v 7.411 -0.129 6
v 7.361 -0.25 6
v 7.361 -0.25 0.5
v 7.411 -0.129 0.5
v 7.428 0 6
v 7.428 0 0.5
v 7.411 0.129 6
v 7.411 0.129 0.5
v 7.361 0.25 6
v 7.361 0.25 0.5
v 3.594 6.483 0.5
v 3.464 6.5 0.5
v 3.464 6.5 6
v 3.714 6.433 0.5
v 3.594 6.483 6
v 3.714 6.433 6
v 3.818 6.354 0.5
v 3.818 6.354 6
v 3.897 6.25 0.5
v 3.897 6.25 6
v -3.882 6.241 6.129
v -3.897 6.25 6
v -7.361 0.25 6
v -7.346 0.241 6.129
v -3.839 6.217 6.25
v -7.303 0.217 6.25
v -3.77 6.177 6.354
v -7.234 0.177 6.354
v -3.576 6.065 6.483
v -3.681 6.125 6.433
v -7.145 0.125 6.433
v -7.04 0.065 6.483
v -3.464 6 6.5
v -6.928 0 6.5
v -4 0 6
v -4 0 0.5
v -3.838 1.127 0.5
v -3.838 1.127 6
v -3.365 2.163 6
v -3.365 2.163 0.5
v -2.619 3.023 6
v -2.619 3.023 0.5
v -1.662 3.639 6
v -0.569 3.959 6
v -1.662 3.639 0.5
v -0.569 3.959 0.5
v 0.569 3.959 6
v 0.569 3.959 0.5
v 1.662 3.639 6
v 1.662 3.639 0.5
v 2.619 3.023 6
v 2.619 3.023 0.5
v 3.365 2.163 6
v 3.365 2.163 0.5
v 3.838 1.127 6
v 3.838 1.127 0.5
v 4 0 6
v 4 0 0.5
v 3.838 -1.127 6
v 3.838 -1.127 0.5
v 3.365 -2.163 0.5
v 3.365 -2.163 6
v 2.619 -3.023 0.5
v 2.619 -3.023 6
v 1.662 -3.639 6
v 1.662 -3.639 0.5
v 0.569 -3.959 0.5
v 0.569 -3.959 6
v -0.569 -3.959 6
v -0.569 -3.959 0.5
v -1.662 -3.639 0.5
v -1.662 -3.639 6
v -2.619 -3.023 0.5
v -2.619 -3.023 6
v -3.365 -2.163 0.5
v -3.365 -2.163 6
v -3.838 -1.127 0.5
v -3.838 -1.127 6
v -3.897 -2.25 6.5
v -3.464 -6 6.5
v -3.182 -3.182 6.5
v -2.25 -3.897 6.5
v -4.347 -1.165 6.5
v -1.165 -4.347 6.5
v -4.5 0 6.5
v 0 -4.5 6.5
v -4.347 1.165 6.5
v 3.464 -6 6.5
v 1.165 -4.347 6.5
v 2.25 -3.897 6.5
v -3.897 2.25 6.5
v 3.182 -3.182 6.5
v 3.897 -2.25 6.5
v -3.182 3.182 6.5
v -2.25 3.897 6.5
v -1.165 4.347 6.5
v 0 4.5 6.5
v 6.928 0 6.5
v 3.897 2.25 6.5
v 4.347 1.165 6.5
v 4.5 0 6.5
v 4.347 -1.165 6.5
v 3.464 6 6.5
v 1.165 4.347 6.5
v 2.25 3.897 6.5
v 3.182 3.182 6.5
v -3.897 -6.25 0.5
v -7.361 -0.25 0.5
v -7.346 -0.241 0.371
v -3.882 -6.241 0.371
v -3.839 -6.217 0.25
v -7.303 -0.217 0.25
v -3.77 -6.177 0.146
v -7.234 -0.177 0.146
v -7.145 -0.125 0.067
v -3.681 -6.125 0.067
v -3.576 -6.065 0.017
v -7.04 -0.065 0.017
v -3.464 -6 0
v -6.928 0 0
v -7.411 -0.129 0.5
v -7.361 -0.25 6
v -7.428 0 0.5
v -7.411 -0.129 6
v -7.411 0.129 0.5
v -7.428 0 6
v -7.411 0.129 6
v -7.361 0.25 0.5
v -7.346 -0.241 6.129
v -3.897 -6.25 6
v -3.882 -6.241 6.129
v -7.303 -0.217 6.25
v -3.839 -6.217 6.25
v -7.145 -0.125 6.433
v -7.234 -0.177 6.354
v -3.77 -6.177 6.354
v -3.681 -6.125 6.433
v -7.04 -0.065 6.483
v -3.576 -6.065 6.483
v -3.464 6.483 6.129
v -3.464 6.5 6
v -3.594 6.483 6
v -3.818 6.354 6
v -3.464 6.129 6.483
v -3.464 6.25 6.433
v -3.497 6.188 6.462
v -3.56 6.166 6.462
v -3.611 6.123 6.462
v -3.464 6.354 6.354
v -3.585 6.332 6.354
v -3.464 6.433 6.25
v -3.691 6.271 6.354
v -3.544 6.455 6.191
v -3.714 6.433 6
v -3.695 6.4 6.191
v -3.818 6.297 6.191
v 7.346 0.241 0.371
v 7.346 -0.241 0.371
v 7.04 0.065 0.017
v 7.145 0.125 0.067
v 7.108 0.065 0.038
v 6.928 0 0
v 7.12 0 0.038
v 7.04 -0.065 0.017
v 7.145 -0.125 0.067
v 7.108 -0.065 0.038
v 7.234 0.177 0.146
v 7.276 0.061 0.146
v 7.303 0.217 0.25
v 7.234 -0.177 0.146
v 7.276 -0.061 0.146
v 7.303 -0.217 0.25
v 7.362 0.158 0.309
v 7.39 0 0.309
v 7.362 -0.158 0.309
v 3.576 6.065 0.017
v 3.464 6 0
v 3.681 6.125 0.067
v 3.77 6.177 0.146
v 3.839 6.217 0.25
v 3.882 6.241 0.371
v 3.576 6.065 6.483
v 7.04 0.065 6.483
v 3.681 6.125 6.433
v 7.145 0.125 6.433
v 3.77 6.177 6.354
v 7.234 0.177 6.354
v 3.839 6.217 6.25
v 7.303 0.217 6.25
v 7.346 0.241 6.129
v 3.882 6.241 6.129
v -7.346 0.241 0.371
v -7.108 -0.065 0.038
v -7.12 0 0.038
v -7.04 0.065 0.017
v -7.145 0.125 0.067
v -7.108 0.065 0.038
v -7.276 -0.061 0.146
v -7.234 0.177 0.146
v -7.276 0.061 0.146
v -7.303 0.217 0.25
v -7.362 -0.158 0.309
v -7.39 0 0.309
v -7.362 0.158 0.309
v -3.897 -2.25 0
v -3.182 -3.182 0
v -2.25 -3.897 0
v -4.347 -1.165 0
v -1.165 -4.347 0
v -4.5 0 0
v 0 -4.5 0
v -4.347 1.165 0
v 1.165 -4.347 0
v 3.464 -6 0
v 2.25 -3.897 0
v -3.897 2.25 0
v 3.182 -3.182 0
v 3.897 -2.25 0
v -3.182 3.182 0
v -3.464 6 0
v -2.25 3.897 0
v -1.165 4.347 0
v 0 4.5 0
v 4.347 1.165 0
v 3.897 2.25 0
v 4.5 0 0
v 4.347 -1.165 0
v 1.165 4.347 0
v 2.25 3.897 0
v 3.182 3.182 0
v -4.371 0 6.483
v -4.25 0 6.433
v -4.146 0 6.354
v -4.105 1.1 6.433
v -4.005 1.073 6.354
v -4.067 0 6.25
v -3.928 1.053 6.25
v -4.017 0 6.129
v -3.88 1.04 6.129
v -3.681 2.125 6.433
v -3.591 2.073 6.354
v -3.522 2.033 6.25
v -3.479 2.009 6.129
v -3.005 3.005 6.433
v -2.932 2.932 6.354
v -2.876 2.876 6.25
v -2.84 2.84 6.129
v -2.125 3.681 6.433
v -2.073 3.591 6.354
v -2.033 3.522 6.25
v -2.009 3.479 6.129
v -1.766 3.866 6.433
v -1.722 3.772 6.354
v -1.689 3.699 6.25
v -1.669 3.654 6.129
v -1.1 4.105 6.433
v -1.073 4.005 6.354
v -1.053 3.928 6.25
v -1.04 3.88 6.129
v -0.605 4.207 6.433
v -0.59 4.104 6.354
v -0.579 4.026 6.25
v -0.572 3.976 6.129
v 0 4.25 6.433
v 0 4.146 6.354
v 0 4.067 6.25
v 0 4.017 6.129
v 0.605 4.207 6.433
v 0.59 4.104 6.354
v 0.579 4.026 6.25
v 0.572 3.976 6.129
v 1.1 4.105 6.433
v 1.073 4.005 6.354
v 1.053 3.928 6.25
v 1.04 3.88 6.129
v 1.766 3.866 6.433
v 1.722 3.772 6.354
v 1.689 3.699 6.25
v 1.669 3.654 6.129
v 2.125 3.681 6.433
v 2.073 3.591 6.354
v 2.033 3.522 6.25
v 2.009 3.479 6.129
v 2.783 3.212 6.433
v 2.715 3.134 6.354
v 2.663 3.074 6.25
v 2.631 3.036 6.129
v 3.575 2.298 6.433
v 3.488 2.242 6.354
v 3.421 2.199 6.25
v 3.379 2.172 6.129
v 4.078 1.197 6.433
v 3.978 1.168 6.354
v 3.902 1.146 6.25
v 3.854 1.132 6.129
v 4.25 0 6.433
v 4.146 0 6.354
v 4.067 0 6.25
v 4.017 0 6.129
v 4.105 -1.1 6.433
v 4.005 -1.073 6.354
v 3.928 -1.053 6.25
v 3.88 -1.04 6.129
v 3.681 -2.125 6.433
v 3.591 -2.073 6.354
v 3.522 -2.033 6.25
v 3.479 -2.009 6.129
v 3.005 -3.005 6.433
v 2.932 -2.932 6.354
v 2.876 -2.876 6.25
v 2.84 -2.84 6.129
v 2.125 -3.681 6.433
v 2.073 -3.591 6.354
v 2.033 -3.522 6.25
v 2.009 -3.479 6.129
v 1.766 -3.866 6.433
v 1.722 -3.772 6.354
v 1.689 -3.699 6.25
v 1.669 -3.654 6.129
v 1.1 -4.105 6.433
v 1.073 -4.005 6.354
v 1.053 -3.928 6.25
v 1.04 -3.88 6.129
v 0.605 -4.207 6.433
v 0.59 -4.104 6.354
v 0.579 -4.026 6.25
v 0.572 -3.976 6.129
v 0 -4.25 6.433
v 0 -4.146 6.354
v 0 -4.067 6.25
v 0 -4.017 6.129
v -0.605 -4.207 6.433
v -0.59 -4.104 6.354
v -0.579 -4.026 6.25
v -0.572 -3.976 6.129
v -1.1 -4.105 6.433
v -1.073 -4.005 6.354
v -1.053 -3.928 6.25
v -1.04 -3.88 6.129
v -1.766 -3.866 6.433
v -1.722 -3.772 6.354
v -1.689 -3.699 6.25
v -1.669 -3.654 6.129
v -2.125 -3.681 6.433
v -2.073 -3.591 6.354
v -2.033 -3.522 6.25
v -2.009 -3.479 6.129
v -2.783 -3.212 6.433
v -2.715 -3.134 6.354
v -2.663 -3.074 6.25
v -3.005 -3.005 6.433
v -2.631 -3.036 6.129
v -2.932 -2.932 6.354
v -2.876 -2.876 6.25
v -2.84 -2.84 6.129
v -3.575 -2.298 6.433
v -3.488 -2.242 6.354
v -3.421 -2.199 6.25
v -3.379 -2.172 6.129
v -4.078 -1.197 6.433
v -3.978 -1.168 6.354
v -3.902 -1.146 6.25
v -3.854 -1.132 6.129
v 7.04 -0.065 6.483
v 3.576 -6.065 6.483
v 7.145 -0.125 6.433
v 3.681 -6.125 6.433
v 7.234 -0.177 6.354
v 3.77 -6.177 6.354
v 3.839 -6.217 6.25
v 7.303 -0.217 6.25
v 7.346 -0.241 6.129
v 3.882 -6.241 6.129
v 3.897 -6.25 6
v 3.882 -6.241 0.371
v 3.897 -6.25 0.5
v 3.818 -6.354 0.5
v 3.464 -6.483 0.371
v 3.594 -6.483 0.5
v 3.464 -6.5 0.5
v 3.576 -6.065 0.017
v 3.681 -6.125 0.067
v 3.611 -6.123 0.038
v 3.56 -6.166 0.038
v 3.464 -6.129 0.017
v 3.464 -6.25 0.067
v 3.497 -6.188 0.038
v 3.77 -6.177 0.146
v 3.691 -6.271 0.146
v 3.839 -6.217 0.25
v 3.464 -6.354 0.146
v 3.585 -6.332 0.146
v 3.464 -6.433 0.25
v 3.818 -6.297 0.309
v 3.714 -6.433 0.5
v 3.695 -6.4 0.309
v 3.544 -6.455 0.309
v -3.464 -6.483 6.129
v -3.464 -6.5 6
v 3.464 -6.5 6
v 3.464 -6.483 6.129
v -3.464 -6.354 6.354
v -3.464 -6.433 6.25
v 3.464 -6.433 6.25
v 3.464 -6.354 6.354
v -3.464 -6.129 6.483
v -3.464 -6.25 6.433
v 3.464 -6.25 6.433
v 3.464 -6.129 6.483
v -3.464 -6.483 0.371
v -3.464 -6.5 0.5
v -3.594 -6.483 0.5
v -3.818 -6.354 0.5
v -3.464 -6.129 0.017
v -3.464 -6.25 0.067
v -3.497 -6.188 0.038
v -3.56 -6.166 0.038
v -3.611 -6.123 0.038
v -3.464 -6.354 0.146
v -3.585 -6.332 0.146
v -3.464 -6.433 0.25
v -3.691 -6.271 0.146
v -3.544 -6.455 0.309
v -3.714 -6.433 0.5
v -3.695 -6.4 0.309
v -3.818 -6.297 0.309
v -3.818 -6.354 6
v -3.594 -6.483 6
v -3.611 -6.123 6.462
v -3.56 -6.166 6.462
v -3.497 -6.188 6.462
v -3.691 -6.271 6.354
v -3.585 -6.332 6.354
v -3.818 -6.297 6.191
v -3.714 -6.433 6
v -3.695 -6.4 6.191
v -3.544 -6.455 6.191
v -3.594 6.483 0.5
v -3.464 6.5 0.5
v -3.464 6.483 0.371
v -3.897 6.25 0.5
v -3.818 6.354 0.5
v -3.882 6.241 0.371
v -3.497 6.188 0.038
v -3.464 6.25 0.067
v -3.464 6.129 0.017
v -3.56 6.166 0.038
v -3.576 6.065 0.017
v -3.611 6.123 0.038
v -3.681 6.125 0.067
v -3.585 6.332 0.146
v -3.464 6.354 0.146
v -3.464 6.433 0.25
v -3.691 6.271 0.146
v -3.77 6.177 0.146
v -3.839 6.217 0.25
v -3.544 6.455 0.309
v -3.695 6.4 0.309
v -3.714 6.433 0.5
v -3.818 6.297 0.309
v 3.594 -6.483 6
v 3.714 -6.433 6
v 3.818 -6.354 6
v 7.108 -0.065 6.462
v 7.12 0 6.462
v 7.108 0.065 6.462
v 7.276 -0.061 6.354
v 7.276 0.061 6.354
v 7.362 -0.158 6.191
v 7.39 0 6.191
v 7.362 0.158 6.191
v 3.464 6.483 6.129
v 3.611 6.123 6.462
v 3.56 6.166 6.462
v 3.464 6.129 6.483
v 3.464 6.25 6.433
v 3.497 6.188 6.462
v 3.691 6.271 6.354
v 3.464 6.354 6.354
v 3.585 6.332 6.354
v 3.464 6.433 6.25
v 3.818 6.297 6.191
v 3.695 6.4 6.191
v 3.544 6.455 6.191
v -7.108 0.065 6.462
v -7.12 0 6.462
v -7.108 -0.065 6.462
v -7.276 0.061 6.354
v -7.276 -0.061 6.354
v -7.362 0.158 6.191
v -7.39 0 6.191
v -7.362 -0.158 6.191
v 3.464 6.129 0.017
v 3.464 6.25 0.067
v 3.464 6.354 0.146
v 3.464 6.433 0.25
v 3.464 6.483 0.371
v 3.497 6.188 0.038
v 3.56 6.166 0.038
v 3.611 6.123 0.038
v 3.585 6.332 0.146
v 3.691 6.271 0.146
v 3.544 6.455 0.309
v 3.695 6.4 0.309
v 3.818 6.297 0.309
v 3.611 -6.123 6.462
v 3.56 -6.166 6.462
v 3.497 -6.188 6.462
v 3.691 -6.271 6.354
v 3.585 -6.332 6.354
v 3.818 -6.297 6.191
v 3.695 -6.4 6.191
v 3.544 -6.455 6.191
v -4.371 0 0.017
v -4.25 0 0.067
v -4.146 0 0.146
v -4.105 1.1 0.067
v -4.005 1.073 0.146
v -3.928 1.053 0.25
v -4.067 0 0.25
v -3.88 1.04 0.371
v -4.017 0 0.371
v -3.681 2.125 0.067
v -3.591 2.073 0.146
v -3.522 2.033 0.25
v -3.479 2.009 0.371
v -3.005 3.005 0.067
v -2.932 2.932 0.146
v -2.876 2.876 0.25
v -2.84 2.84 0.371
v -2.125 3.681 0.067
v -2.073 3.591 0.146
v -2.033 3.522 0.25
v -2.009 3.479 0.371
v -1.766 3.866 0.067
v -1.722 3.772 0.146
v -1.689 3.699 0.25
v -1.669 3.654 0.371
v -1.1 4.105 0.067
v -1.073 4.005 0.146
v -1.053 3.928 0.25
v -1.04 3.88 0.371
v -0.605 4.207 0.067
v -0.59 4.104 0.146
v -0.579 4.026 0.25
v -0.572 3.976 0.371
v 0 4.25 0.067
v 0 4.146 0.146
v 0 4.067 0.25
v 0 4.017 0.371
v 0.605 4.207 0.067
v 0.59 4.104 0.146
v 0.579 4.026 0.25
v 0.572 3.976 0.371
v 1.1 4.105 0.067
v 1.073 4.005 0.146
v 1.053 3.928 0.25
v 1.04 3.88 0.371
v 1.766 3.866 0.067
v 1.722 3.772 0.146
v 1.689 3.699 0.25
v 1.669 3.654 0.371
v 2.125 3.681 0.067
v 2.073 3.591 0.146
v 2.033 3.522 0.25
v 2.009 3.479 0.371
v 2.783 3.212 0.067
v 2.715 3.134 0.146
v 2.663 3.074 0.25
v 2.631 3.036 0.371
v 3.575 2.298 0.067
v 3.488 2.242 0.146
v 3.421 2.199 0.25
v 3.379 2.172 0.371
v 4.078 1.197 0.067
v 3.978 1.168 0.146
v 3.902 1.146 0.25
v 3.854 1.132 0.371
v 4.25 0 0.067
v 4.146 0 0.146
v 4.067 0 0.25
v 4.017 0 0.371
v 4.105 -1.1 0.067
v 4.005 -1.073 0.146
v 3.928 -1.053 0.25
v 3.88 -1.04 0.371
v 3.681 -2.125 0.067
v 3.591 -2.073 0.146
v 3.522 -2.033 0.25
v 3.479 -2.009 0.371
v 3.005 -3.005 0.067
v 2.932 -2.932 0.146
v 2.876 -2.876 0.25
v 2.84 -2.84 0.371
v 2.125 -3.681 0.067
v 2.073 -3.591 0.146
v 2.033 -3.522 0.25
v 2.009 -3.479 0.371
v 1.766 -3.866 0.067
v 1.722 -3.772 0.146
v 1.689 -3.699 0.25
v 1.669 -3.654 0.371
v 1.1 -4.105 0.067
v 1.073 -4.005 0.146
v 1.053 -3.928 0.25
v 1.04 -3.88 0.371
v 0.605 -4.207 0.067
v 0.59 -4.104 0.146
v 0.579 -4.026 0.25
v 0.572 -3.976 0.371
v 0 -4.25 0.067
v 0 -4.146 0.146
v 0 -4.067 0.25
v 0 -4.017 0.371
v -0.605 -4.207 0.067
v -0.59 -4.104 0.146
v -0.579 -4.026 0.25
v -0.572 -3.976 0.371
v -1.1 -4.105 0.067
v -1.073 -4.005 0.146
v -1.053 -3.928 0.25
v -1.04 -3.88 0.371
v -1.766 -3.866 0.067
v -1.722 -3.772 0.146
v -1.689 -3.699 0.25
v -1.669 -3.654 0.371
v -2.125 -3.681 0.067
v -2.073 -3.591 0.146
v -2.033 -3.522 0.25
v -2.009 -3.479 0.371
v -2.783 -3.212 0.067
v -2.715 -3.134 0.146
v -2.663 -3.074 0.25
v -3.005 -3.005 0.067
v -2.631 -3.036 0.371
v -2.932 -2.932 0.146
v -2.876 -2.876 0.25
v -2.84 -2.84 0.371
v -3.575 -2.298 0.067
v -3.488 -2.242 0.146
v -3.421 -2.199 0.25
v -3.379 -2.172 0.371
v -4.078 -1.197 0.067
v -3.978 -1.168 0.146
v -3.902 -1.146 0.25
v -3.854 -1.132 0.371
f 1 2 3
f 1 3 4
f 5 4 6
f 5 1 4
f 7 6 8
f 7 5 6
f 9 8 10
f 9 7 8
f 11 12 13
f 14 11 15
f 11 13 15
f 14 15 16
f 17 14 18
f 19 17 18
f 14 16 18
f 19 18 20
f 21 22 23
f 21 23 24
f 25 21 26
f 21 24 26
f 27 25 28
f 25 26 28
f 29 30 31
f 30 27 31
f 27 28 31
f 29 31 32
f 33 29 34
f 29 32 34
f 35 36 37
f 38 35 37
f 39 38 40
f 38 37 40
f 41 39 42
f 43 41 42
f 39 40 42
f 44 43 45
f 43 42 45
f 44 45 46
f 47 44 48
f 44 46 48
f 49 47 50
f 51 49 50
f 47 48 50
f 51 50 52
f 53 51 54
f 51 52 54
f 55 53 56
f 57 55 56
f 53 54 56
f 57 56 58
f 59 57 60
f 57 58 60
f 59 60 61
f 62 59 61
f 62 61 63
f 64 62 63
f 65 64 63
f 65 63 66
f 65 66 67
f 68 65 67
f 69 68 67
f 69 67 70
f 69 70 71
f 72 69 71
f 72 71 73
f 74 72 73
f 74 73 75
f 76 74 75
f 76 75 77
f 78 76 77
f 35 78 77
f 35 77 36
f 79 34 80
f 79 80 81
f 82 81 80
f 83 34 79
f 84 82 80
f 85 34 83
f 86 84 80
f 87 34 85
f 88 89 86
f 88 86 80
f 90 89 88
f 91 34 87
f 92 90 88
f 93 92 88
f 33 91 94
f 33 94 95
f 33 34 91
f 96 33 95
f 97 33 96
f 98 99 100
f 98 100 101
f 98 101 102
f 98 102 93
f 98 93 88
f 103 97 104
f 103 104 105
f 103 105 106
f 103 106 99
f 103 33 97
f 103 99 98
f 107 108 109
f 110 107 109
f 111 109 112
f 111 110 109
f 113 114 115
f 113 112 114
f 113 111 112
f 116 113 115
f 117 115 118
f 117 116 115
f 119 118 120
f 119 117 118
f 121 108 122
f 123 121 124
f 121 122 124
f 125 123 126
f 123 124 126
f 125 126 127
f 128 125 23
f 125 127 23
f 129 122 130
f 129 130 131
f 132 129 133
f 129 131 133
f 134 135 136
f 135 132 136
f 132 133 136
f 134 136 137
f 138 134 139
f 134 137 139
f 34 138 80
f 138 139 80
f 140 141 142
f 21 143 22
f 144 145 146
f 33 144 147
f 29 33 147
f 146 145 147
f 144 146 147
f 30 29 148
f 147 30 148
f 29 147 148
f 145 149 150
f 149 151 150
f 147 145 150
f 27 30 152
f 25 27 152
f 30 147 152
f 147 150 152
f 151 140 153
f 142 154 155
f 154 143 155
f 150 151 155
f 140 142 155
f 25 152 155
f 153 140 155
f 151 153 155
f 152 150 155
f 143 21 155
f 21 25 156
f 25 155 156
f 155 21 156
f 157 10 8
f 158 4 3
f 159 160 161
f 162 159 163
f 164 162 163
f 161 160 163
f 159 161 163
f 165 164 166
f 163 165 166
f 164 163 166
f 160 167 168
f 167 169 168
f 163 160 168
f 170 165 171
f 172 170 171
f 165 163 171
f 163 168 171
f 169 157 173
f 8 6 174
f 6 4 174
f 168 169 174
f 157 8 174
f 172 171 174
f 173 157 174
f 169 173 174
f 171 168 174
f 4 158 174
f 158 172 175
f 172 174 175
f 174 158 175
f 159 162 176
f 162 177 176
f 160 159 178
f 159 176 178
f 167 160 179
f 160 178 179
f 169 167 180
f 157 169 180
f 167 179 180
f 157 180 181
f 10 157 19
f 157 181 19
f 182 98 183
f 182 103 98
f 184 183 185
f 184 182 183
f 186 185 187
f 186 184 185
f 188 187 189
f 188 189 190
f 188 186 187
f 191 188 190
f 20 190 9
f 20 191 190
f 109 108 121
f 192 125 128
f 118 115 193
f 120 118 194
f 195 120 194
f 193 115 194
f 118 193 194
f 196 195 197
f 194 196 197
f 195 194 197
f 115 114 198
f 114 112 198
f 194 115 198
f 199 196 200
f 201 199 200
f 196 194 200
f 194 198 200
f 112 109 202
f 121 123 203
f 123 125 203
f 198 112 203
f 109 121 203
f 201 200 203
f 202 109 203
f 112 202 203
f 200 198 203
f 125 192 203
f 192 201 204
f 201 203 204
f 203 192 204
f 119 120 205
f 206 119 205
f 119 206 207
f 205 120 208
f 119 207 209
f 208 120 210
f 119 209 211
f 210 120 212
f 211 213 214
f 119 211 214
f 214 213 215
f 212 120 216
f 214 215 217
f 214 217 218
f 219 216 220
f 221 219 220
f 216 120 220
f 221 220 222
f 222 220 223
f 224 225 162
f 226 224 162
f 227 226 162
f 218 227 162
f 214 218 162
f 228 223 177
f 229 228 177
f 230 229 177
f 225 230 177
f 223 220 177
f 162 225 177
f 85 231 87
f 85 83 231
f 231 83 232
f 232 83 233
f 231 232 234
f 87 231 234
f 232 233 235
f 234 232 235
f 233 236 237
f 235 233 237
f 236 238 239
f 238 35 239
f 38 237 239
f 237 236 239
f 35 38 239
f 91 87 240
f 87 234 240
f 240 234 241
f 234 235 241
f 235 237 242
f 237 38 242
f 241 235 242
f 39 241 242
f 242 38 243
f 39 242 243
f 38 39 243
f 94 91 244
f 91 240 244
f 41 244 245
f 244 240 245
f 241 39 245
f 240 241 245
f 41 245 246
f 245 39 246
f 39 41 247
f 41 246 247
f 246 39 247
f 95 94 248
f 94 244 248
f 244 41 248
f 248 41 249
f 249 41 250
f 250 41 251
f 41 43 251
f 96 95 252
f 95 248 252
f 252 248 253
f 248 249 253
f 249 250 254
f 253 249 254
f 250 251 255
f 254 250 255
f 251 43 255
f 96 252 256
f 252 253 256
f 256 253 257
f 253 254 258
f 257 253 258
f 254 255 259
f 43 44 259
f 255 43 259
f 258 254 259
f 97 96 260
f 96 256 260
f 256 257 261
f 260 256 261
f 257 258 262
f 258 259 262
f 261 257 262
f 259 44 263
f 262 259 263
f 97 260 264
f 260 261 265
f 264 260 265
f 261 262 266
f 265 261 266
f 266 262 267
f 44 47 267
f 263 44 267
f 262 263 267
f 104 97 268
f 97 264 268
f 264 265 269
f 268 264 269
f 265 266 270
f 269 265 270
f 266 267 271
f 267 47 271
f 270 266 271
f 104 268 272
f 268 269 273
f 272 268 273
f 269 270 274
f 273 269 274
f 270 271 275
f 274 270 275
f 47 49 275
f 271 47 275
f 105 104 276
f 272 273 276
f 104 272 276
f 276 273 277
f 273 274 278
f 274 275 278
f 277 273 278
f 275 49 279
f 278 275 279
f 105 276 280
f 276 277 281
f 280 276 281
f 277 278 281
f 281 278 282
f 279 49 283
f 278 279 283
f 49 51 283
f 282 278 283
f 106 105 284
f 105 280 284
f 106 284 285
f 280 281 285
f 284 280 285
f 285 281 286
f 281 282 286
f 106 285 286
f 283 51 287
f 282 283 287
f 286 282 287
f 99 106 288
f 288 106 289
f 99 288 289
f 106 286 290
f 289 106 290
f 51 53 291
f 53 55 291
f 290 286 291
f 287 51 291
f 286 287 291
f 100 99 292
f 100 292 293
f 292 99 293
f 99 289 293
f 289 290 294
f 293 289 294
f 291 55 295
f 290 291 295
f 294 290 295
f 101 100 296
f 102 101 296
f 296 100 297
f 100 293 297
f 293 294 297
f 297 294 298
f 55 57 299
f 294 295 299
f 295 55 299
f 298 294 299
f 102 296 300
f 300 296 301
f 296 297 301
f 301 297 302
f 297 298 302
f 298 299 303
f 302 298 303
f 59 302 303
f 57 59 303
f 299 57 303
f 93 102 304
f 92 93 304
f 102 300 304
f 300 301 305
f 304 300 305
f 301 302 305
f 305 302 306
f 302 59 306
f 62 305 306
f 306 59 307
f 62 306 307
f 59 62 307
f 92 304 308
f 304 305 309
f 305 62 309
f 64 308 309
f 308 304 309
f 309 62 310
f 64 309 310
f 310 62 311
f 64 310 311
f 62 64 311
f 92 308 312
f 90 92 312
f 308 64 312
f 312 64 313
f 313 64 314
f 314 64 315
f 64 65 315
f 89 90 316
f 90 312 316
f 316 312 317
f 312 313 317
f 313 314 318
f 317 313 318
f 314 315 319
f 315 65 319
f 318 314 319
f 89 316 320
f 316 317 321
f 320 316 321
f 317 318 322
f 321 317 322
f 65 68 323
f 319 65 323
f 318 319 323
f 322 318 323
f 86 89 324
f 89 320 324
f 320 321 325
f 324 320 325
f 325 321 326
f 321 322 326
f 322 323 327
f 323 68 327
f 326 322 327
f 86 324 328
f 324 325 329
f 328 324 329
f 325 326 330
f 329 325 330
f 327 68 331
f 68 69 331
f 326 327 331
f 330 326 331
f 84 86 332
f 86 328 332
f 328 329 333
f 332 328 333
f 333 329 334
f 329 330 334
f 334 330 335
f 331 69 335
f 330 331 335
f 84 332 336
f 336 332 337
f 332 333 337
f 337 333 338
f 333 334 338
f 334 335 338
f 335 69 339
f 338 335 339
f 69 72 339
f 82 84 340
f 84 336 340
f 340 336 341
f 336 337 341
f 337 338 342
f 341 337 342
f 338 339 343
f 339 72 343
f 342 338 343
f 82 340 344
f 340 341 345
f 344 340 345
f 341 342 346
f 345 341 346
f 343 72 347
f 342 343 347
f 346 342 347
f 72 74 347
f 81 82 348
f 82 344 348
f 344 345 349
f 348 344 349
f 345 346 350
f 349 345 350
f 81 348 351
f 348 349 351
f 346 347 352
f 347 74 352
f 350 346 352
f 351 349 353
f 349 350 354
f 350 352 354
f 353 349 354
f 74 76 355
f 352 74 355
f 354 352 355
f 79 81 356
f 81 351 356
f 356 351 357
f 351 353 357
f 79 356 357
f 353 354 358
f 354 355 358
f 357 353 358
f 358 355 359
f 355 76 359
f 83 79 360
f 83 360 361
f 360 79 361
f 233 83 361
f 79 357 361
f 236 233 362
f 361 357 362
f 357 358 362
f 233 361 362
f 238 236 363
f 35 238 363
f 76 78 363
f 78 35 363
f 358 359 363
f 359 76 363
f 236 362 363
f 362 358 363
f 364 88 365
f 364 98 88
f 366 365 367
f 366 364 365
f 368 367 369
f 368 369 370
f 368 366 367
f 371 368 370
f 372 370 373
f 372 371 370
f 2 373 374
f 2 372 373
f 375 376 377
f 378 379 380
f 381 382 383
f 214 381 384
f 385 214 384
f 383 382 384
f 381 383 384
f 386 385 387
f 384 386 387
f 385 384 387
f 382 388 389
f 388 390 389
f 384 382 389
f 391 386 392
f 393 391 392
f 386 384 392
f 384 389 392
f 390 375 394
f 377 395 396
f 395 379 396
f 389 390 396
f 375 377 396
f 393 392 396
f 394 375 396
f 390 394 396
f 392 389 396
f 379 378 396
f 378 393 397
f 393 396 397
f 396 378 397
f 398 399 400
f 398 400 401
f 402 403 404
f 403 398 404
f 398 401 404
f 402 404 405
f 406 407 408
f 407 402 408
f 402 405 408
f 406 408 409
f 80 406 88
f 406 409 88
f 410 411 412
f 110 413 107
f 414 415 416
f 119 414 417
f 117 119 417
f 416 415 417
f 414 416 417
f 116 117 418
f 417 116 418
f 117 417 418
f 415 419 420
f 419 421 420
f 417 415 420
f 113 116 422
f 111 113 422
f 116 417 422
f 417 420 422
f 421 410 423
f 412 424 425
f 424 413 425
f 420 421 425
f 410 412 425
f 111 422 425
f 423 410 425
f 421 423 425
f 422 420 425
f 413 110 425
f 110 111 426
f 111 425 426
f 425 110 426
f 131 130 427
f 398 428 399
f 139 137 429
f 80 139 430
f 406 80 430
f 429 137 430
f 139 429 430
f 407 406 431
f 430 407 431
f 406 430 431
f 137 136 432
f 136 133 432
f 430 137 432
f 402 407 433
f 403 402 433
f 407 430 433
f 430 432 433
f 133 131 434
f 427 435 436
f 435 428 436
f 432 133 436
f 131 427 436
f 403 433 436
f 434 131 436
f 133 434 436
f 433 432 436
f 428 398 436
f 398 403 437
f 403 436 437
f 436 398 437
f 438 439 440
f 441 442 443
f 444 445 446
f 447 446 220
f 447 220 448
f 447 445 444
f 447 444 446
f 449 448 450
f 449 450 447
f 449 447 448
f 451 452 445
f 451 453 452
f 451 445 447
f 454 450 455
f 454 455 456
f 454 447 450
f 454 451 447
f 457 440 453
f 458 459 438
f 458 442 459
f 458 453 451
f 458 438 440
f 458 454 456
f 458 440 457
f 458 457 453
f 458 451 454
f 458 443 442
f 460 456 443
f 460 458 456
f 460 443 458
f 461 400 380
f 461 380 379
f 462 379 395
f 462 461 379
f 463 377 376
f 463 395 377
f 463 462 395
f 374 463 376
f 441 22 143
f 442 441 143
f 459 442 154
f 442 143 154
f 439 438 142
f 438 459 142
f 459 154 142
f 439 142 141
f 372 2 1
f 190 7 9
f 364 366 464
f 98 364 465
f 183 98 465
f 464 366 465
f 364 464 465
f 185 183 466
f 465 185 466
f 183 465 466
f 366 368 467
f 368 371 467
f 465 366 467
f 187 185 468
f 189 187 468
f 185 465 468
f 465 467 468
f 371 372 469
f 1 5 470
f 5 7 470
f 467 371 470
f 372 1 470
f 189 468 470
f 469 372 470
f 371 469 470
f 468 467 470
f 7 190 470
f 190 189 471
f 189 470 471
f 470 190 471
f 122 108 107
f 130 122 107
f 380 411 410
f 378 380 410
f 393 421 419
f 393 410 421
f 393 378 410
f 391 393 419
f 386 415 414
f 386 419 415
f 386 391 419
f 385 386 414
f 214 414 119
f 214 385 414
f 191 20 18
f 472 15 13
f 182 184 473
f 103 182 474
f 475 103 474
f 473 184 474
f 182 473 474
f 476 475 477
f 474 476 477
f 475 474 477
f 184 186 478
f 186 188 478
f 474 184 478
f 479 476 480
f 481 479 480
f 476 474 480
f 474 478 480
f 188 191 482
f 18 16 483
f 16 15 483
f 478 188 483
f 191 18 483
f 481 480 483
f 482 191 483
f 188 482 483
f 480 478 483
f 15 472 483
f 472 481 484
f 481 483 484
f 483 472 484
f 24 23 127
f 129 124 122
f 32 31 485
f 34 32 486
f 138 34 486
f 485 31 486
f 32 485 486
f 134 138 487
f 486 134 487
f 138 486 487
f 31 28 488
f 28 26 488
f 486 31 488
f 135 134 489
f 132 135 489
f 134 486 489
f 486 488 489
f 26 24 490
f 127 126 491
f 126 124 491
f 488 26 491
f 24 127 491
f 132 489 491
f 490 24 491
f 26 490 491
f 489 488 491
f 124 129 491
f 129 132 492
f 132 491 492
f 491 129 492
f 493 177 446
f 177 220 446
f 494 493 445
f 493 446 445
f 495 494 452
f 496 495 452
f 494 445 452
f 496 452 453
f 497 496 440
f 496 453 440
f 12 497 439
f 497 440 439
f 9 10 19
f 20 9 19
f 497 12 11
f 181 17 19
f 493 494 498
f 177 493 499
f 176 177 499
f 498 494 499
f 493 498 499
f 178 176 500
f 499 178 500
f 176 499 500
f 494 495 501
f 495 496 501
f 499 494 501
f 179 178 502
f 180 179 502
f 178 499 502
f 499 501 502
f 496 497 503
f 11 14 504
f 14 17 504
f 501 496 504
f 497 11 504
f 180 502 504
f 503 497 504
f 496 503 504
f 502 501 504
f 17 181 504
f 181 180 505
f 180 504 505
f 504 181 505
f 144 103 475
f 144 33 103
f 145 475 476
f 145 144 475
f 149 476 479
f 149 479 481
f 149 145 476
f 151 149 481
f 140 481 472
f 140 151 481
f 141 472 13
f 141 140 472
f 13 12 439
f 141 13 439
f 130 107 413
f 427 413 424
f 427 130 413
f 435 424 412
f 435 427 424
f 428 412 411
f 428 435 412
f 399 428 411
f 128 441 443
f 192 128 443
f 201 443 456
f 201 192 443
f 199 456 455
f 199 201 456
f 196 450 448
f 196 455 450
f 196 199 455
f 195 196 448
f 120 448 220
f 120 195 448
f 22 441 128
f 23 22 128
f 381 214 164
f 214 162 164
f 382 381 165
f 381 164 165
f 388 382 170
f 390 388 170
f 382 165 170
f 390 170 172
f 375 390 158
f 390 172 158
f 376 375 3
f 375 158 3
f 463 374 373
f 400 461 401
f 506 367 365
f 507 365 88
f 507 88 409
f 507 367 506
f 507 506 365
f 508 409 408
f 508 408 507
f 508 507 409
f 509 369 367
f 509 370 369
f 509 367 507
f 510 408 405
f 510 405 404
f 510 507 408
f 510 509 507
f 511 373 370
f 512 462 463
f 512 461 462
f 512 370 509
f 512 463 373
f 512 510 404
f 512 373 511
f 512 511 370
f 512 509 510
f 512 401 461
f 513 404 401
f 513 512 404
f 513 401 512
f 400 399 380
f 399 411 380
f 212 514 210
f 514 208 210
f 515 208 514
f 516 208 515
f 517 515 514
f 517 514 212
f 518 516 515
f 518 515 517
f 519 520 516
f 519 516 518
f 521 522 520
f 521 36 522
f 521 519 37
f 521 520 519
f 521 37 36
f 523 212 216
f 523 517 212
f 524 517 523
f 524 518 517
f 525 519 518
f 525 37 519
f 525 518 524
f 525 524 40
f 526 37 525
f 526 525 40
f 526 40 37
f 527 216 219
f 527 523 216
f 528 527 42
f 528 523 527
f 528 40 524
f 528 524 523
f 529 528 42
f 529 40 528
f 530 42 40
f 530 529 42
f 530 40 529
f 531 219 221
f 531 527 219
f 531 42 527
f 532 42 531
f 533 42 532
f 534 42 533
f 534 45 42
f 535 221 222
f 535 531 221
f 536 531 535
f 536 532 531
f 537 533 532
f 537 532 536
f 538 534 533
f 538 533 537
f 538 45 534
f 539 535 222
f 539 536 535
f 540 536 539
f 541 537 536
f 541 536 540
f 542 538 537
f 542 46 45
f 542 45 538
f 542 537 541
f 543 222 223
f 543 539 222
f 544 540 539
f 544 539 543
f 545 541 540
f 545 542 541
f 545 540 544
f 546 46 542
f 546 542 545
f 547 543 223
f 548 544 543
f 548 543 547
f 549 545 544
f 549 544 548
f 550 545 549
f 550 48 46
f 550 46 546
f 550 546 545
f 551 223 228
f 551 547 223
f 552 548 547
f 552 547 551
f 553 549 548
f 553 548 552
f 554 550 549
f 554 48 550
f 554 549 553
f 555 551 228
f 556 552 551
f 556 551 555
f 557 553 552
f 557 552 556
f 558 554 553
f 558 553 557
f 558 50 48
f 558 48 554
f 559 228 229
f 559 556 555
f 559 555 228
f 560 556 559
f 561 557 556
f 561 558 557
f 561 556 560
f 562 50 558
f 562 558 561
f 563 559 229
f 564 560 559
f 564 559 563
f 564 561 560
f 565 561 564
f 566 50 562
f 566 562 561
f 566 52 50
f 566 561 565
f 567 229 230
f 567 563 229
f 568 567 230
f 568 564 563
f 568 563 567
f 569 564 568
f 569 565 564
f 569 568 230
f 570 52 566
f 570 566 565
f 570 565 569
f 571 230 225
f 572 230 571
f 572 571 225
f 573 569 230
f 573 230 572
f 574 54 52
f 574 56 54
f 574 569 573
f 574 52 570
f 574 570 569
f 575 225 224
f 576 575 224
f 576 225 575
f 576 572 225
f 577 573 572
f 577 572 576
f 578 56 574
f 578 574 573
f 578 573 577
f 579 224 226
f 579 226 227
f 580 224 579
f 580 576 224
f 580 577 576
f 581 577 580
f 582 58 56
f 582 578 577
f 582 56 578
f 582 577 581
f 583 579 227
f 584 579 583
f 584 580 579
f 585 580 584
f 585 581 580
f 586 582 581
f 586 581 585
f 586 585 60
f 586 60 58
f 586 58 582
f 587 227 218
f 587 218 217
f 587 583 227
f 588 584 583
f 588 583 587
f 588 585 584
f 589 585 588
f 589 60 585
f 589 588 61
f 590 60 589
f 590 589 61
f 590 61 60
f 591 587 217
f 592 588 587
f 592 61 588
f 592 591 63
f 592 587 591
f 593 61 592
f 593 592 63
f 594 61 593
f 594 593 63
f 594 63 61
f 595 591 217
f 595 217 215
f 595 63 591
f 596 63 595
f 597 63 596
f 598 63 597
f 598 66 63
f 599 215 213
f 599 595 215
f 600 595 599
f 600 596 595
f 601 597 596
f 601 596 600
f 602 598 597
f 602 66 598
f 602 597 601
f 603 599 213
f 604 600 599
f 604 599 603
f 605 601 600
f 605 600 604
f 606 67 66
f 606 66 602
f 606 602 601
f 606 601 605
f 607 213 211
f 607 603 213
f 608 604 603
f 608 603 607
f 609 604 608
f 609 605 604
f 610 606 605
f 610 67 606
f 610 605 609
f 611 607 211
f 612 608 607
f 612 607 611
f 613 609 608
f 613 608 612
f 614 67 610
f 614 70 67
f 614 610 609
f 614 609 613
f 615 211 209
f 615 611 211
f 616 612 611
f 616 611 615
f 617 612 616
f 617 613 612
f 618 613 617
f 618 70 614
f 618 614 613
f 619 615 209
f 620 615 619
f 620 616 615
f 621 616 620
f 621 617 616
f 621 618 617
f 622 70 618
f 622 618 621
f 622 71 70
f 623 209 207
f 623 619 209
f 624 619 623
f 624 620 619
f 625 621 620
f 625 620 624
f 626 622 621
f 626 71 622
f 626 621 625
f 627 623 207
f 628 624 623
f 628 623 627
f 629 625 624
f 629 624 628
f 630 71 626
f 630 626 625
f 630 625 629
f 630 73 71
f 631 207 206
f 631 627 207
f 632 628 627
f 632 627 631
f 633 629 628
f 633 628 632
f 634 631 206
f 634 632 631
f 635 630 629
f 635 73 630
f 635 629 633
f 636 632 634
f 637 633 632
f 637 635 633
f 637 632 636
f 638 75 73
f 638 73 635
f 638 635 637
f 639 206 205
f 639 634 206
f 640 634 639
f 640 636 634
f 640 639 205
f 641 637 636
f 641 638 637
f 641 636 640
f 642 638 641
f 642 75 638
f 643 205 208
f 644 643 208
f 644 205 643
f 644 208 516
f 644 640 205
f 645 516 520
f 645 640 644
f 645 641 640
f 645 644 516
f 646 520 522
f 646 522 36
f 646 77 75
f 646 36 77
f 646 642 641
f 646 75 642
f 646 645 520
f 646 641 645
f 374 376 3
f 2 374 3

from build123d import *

# Parameters (mm, degrees)
BOSS_EXTRUDE1_DEPTH      = 6.5
M7_CLEARANCE_HOLE1_D     = 8
M7_CLEARANCE_HOLE1_DEPTH = 14
M7_CLEARANCE_HOLE1_TIP   = 2.403442476
FILLET1_R                = 0.5


with BuildPart() as part:
    # Sketch1 → Boss-Extrude1 (new body)
    with BuildSketch(Plane.XY):
        Polygon((-7.505553499, 0), (-3.75277675, -6.5), (3.75277675, -6.5), (7.505553499, 0), (3.75277675, 6.5), (-3.75277675, 6.5), align=None)
    extrude(amount=BOSS_EXTRUDE1_DEPTH)

    # M7 Clearance Hole1
    with Locations(Plane.XY.offset(6.5)):
        with Locations((0, 0)):
            Hole(M7_CLEARANCE_HOLE1_D / 2, depth=M7_CLEARANCE_HOLE1_DEPTH)
            with Locations((0, 0, -(M7_CLEARANCE_HOLE1_DEPTH + M7_CLEARANCE_HOLE1_TIP / 2))):  # 118° drill point
                Cone(0, M7_CLEARANCE_HOLE1_D / 2, M7_CLEARANCE_HOLE1_TIP, mode=Mode.SUBTRACT)

    # Fillet1
    fillet1_edges = [part.edges().sort_by_distance(p)[0] for p in [
        (0, -6.5, 6.5),
        (-3.75277675, 6.5, 3.25),
        (3.75277675, 6.5, 3.25),
        (7.505553499, 0, 3.25),
        (3.75277675, -6.5, 3.25),
        (-3.75277675, -6.5, 3.25),
        (-7.505553499, 0, 3.25),
        (5.629165125, -3.25, 6.5),
        (5.629165125, 3.25, 6.5),
        (0, 6.5, 6.5),
        (4, 0, 0),
        (4, 0, 6.5),
        (-5.629165125, 3.25, 6.5),
        (0, 6.5, 0),
        (5.629165125, 3.25, 0),
        (5.629165125, -3.25, 0),
        (-5.629165125, -3.25, 6.5),
        (0, -6.5, 0),
        (-5.629165125, -3.25, 0),
        (-5.629165125, 3.25, 0),
    ]]
    fillet(fillet1_edges, radius=FILLET1_R)


solid = part.part
